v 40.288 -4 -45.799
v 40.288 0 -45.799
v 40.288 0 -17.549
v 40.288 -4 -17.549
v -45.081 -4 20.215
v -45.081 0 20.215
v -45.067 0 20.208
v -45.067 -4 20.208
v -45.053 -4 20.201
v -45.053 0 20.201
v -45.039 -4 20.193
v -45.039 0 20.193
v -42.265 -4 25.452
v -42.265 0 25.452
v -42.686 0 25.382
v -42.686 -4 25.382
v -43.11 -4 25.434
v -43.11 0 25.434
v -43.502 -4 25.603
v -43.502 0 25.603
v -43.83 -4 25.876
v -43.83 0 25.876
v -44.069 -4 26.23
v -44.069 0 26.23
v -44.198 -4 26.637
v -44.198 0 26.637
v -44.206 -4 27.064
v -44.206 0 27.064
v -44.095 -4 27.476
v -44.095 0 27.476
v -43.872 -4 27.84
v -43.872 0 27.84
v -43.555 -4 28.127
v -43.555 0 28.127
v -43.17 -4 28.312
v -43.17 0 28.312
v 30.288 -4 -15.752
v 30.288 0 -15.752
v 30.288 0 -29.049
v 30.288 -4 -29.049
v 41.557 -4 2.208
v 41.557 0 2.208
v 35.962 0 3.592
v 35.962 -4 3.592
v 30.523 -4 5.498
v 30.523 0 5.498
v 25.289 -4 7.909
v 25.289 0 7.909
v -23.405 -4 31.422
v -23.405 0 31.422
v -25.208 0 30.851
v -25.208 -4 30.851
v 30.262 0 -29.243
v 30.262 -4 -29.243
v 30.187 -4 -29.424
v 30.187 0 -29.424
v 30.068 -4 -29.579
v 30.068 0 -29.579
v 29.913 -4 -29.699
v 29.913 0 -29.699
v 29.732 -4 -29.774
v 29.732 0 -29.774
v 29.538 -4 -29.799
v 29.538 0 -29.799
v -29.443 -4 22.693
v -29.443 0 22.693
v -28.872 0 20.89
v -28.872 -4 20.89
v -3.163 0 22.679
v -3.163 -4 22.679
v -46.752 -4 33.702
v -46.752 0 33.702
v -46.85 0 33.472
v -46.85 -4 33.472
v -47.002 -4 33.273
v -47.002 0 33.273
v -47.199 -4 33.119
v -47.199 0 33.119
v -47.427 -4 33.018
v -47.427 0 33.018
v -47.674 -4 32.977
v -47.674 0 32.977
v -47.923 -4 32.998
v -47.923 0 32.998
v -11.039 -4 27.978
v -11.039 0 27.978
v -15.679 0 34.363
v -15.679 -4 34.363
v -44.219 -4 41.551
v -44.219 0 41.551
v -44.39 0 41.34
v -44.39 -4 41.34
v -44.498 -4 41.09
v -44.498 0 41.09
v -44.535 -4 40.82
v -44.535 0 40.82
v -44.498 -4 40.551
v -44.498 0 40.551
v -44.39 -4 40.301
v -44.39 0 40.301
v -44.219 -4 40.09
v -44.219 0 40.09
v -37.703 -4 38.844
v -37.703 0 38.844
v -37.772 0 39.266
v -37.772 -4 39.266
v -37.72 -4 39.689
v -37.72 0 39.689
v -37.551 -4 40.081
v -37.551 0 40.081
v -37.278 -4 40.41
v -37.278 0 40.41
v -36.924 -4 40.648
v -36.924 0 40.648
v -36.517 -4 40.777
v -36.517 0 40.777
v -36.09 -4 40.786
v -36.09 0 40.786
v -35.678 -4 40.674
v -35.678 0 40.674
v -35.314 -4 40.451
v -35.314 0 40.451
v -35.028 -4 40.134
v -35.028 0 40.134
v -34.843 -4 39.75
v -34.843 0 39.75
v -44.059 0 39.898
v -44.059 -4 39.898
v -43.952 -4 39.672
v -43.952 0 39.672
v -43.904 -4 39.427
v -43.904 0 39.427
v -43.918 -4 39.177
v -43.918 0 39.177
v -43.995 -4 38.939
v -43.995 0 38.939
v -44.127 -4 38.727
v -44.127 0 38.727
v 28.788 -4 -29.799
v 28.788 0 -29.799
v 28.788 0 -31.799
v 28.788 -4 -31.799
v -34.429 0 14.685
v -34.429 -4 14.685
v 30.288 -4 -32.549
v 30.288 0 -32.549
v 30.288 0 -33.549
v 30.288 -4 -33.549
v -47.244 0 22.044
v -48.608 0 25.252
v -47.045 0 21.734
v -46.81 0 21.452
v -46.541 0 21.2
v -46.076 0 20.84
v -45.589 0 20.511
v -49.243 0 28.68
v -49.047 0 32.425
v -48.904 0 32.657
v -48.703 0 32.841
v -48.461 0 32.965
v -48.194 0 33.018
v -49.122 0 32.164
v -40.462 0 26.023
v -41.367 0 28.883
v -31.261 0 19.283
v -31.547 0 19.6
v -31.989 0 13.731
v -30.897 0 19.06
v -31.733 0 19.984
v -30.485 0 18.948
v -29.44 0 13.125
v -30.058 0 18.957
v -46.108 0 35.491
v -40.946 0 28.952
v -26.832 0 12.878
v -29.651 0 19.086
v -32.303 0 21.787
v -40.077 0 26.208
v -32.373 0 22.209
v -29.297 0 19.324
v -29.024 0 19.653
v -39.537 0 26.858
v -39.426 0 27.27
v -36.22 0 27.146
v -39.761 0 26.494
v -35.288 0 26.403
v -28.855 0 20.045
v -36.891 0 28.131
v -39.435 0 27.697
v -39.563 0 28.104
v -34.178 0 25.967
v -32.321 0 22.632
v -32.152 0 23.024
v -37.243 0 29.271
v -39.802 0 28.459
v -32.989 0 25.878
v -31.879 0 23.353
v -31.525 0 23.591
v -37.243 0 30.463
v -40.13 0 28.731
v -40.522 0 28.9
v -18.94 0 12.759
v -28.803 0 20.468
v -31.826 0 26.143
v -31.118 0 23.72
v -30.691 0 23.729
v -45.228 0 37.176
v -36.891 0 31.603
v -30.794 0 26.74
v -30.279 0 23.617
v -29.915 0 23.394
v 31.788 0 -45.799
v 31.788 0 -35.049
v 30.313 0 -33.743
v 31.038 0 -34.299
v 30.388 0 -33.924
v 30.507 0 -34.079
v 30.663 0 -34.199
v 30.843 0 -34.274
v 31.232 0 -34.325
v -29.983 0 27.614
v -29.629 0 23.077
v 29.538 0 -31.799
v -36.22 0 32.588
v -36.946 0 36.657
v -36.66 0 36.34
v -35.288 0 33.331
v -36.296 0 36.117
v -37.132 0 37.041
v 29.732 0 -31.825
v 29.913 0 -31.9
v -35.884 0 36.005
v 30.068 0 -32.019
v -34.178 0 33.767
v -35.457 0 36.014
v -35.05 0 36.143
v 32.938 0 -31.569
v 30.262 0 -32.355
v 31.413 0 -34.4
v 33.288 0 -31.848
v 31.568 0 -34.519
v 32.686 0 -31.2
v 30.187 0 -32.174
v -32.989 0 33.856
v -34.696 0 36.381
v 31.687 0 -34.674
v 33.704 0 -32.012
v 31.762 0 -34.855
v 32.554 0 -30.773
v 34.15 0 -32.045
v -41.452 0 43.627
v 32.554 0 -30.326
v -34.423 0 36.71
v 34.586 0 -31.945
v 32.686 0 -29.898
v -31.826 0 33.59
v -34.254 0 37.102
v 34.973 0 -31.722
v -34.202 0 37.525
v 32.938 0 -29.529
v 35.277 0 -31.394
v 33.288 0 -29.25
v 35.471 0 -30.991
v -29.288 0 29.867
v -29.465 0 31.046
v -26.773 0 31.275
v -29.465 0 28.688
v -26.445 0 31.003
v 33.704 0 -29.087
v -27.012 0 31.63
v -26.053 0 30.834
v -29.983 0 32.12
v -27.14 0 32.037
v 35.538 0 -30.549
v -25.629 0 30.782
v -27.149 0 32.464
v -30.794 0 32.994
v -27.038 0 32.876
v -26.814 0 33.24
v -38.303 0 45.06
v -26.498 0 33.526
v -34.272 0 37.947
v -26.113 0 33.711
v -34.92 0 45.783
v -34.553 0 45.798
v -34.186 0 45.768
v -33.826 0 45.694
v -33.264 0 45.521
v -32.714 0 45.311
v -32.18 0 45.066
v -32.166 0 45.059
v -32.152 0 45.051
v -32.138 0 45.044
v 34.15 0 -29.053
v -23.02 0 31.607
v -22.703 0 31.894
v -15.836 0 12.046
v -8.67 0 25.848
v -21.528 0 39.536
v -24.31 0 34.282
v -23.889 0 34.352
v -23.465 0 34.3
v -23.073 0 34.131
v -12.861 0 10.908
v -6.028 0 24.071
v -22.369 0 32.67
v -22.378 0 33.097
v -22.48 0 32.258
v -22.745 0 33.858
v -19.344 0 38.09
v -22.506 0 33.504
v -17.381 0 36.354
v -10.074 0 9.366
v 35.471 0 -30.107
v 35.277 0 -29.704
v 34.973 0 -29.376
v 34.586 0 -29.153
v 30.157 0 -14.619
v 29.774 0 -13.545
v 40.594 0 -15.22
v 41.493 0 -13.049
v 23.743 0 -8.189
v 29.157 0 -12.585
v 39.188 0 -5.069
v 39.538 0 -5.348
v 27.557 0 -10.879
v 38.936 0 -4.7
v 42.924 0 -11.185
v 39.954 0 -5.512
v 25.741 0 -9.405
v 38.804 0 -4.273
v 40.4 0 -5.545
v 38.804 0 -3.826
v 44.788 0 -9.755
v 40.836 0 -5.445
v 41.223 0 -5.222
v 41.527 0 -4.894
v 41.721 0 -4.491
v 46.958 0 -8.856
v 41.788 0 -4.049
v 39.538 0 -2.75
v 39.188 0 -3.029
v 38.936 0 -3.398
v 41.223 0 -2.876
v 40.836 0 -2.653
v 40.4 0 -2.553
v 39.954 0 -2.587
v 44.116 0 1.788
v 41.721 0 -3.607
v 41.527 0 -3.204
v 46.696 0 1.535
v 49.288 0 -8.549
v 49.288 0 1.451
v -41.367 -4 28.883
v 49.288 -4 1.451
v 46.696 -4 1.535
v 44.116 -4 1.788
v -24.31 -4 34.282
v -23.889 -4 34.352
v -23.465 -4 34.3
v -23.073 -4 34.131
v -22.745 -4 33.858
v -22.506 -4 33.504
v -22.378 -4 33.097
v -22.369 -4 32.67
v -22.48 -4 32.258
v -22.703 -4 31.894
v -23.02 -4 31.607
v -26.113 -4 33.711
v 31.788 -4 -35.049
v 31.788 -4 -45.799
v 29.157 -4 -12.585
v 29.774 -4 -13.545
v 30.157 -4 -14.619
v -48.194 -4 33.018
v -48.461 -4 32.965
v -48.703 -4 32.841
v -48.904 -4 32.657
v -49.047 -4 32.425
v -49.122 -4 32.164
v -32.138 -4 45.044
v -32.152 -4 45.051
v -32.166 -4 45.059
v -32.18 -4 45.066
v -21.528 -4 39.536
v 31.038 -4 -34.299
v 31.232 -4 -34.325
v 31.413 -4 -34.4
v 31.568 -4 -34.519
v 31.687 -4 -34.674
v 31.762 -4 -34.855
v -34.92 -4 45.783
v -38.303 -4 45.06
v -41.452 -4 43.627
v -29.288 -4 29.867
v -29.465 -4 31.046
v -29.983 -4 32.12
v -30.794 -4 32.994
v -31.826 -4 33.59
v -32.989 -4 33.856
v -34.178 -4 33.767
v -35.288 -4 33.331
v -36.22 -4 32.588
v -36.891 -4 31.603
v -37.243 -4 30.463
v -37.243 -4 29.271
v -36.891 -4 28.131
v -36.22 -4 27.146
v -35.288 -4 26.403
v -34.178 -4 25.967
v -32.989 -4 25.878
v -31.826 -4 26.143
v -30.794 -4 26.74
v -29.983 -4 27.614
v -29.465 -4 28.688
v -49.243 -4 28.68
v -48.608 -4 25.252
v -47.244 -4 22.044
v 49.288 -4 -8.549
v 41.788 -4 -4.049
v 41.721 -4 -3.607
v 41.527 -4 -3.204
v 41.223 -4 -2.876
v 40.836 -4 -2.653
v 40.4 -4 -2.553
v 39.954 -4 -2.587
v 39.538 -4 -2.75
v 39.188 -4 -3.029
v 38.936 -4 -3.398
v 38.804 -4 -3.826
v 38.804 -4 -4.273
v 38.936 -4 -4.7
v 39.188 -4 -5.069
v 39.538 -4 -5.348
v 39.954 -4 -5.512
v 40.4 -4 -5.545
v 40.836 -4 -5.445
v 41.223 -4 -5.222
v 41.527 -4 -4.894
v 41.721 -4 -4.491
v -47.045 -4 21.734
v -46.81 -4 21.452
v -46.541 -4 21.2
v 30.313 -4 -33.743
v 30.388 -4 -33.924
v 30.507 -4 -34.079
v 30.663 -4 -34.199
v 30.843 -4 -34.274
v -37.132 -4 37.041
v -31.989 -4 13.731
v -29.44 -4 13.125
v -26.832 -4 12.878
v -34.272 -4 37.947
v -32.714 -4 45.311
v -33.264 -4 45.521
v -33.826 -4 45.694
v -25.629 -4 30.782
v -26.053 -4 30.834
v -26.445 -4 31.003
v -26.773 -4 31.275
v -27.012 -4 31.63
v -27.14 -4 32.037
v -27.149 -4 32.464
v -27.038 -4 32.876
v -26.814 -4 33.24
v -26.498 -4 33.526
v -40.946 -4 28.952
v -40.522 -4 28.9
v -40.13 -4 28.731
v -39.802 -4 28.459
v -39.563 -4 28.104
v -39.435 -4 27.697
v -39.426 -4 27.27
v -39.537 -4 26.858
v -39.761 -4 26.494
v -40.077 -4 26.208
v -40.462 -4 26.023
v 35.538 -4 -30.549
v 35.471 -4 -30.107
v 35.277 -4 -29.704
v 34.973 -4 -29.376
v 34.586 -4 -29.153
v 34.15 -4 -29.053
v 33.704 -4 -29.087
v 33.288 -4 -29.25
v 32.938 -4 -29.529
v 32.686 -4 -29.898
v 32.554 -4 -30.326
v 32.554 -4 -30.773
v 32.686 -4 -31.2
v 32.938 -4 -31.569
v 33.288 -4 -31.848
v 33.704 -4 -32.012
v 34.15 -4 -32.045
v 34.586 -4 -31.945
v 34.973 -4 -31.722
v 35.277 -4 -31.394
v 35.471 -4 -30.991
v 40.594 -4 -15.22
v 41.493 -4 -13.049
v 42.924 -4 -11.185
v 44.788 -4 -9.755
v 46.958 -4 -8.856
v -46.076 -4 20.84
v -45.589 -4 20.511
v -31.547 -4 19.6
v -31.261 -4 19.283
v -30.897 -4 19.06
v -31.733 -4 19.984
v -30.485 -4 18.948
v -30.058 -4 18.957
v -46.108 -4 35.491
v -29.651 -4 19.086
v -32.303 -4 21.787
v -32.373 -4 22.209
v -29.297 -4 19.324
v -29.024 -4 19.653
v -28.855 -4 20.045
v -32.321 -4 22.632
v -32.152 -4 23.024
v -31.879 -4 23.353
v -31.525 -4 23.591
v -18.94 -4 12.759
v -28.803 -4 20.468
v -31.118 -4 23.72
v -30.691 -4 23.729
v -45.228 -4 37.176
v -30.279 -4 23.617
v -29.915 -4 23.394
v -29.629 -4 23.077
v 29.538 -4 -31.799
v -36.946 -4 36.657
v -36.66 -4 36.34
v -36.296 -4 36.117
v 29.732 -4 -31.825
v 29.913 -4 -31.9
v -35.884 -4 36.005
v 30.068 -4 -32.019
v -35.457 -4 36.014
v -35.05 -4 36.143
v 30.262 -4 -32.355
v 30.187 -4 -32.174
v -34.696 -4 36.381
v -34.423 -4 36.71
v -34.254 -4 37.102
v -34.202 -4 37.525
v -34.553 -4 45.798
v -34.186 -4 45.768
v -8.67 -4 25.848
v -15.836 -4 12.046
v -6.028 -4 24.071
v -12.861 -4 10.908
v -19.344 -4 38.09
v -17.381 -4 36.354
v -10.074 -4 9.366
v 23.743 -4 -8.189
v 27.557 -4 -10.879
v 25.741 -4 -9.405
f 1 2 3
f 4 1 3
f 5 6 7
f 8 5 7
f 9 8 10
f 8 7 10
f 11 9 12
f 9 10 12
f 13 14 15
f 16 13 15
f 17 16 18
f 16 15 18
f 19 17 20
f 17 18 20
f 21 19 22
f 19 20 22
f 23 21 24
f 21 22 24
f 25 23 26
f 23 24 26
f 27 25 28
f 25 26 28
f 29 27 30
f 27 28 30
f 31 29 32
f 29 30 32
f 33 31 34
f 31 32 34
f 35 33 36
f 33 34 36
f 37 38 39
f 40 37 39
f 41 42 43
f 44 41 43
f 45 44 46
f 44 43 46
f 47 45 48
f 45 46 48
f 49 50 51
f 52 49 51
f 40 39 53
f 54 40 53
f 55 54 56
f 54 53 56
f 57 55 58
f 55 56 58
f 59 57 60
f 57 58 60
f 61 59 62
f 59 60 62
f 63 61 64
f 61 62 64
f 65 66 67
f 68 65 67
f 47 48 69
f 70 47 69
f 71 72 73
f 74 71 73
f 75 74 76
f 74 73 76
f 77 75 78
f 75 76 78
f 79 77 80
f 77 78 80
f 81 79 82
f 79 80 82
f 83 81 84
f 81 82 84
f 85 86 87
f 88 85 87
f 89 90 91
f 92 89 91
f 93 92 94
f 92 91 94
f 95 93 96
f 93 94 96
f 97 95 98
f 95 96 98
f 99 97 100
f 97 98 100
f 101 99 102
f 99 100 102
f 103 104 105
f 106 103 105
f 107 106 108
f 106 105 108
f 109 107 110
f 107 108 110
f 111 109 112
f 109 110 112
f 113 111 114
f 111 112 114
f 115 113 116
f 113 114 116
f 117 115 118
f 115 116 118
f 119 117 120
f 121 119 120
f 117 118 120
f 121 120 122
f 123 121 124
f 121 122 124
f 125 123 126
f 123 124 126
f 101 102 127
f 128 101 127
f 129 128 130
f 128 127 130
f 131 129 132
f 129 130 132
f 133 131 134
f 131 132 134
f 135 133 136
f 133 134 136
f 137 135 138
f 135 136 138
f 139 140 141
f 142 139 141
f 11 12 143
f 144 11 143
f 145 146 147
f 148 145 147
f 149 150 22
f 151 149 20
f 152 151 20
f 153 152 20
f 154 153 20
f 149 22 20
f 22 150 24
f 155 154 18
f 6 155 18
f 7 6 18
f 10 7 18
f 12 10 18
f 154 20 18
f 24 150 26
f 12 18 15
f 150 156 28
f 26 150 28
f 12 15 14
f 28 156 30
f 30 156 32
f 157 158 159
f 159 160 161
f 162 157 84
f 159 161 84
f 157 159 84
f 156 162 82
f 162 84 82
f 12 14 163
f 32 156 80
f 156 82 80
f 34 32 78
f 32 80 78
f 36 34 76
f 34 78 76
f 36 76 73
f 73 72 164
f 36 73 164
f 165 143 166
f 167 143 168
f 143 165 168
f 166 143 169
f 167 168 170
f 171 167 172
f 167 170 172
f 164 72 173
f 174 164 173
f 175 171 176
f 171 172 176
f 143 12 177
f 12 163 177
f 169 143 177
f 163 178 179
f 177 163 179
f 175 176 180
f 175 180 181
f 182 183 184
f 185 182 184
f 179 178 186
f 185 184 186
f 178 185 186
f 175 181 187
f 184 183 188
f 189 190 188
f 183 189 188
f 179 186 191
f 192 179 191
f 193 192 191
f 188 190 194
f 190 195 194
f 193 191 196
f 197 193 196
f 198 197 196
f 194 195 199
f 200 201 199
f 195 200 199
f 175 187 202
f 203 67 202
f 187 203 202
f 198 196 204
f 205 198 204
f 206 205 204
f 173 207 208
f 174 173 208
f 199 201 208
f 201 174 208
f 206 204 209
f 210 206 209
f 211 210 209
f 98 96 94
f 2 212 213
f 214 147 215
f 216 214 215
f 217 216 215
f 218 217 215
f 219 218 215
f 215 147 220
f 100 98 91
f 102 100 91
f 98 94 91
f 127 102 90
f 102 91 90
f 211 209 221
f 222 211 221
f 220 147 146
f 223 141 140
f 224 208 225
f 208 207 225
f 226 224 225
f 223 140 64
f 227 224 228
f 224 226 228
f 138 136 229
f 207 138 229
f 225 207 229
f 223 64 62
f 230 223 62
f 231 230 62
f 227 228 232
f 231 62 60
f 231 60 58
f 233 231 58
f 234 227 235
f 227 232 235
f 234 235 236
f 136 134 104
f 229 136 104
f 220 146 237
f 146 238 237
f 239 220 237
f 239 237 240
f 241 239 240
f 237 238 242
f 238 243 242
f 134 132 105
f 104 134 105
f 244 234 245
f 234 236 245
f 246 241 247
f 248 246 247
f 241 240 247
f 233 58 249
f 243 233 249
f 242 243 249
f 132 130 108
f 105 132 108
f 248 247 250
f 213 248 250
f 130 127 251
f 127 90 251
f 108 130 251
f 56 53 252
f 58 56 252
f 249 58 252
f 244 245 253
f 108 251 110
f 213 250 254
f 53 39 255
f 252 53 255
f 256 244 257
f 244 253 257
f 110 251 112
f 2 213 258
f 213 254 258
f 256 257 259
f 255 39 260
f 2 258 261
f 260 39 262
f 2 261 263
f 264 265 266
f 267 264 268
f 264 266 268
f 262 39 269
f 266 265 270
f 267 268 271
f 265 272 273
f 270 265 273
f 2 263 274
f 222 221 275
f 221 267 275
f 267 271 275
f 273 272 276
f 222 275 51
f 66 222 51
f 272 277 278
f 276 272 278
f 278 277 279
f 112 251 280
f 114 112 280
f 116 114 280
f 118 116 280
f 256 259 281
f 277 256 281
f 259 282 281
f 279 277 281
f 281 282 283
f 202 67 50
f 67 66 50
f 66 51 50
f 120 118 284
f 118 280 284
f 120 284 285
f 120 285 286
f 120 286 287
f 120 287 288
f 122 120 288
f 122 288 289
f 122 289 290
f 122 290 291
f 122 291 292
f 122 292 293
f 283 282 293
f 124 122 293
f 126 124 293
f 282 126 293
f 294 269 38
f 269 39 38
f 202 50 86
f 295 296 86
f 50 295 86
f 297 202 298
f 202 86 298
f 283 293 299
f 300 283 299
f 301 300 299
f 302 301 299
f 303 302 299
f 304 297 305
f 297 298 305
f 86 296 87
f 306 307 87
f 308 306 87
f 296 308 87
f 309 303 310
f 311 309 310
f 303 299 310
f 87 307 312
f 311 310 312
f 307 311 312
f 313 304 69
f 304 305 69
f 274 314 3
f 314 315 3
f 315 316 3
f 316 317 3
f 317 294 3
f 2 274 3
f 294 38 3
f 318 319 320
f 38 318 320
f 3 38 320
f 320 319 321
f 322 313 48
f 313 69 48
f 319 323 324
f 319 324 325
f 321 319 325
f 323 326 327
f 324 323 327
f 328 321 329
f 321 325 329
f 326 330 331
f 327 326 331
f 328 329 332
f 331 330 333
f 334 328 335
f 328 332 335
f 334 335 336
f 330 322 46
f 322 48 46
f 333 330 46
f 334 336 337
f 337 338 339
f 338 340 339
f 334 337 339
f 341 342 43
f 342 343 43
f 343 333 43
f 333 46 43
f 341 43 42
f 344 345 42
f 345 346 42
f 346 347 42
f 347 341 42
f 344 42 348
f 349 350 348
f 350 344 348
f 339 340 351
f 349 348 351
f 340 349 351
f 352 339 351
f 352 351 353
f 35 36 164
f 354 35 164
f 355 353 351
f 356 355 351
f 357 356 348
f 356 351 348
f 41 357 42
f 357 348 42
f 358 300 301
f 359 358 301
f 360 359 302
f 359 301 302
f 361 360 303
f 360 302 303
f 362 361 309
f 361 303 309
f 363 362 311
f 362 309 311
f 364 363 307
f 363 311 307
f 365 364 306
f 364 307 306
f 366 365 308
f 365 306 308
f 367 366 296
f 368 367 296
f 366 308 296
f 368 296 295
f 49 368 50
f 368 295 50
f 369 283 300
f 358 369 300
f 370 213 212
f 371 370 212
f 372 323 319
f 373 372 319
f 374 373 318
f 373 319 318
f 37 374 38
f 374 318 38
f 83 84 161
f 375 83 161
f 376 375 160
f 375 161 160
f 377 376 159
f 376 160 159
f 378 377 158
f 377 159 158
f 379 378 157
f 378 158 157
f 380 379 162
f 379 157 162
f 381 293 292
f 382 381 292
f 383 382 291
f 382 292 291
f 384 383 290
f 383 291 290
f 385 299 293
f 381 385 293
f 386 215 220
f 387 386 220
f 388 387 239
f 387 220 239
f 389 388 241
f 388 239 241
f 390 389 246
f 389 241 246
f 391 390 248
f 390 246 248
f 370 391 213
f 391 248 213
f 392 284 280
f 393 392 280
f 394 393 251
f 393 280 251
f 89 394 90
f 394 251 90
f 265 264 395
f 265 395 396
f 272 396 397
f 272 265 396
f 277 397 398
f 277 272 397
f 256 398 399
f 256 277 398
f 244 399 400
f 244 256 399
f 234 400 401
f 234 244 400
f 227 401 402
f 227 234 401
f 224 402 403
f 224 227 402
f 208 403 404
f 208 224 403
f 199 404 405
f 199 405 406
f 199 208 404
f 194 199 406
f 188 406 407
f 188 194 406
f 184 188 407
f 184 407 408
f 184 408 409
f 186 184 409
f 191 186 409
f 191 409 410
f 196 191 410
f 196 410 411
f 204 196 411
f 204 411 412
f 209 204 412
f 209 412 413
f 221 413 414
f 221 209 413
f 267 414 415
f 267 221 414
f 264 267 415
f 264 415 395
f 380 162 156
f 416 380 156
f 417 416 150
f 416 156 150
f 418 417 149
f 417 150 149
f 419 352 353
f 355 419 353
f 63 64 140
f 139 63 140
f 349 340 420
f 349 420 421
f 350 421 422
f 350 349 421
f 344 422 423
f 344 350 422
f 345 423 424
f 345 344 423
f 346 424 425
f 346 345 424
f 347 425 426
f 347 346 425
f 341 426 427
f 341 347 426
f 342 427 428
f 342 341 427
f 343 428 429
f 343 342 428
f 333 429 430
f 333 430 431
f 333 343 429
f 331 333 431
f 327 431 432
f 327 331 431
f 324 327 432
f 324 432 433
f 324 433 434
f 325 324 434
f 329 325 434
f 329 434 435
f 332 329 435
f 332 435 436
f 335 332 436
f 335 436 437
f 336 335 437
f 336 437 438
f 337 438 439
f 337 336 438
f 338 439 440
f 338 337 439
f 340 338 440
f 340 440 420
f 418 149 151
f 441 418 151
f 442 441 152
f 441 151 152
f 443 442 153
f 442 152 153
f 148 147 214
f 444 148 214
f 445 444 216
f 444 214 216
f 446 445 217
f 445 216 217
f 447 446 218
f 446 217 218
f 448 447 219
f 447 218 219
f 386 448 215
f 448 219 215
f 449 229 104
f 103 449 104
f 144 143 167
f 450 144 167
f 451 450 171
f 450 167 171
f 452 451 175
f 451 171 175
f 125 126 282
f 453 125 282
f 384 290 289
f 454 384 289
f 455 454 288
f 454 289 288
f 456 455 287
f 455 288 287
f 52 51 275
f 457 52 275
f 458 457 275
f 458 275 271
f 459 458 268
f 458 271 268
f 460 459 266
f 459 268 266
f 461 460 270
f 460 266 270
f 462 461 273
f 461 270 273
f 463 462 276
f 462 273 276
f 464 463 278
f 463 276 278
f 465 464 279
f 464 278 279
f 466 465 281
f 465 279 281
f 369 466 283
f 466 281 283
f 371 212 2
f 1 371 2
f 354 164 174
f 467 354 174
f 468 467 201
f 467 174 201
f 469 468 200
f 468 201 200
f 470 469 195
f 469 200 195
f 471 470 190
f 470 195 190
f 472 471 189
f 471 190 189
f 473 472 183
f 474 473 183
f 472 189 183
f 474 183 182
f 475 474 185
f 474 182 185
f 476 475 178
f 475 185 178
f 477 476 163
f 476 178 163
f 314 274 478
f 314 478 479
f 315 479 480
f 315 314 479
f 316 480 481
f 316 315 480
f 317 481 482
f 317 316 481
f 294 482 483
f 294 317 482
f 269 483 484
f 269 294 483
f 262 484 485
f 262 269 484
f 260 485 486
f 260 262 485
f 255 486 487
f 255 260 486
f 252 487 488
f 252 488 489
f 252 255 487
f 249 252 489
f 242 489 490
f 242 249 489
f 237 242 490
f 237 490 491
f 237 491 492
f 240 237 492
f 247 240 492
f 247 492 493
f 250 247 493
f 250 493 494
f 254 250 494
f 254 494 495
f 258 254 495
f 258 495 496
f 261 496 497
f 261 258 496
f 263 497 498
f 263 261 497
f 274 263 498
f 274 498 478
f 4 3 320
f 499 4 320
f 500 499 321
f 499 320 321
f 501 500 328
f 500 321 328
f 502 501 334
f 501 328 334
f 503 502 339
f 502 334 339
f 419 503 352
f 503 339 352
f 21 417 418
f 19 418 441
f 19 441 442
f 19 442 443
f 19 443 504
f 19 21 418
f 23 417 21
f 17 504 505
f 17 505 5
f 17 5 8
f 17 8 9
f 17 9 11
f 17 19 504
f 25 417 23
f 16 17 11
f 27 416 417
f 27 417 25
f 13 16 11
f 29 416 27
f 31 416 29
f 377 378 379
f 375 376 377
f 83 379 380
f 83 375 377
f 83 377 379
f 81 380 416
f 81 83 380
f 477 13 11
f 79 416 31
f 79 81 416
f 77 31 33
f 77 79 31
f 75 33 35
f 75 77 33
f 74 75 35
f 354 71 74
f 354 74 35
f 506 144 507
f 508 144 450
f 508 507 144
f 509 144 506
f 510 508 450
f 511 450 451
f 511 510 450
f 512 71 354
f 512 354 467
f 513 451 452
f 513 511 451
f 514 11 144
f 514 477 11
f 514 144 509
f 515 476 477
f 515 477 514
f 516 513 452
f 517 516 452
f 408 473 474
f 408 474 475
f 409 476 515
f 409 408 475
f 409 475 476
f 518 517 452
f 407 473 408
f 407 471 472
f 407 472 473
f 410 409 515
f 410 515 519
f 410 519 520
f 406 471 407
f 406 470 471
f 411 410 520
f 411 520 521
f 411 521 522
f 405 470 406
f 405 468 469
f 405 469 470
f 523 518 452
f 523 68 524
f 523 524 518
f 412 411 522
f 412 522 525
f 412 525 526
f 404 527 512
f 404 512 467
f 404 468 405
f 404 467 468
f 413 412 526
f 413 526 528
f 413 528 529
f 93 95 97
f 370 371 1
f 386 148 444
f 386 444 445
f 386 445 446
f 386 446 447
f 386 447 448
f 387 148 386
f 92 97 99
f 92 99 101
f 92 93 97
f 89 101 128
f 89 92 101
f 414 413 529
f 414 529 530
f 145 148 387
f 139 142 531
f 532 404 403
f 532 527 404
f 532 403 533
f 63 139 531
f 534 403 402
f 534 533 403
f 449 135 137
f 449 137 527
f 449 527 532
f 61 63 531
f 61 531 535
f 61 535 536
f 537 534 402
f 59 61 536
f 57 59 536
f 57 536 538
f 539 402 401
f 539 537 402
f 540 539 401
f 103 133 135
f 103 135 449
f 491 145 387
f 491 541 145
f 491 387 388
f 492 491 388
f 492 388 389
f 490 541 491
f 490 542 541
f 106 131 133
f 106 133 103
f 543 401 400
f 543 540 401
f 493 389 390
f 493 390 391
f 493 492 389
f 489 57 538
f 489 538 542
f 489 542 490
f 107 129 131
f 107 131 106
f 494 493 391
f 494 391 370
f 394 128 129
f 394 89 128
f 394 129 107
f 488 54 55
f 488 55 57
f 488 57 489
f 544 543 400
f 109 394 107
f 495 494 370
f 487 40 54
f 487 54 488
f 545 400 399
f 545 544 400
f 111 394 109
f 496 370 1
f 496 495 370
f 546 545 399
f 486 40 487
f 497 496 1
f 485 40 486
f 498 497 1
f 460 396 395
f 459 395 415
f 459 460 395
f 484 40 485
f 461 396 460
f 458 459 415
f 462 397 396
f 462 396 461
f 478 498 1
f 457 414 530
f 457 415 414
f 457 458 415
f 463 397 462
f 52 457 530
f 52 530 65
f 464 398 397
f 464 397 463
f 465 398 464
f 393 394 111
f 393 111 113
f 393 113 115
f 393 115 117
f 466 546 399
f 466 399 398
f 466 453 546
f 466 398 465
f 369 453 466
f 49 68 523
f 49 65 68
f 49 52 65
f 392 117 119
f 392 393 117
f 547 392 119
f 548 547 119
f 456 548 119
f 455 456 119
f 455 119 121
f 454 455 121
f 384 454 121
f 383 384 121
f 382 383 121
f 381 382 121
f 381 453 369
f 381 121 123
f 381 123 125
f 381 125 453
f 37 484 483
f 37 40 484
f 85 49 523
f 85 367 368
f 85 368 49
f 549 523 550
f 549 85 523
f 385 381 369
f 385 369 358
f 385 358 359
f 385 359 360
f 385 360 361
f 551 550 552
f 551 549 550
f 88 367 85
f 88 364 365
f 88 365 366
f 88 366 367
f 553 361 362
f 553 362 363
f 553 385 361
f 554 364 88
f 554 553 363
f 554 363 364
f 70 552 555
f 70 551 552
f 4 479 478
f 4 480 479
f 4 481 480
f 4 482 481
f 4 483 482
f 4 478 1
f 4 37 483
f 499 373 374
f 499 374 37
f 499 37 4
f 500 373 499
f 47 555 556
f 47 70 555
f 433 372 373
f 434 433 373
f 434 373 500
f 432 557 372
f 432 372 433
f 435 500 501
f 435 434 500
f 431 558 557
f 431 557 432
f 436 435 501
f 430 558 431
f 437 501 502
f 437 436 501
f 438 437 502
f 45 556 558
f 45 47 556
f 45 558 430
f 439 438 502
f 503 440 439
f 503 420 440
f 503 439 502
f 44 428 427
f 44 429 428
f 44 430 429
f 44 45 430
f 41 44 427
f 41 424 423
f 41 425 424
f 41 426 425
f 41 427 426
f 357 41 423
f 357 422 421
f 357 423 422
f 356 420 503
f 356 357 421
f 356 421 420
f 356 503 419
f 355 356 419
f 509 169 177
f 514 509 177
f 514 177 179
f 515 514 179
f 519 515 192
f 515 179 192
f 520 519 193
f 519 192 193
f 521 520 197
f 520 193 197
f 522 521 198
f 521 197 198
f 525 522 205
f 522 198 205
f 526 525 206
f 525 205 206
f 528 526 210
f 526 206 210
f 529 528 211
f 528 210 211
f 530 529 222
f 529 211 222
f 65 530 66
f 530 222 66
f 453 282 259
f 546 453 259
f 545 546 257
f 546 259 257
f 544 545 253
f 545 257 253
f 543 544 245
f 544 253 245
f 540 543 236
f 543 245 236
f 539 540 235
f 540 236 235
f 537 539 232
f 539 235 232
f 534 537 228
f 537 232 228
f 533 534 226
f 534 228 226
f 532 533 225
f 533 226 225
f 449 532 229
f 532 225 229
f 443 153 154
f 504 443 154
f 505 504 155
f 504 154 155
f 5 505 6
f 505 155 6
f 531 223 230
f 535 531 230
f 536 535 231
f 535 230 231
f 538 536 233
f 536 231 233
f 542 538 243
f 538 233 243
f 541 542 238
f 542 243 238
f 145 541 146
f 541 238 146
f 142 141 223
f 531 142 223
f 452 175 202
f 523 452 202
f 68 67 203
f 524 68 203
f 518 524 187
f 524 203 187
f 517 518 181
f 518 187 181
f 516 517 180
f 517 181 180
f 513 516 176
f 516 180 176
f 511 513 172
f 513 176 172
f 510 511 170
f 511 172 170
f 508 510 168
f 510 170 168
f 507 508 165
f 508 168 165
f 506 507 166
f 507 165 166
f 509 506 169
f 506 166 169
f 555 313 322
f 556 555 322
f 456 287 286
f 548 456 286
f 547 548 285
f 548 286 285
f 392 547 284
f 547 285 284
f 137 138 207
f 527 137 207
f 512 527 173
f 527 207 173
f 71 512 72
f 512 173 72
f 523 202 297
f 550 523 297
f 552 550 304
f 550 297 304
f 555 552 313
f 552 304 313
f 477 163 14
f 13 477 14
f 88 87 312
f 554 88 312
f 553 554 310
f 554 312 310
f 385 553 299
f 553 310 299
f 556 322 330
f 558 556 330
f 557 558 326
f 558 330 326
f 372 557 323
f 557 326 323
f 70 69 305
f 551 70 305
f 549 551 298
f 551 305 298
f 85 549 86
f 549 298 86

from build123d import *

# Parameters (mm, degrees)
F0_R     = 1.5
F0_R_2   = 4
F1_DEPTH = 4


# Not quite as in the source:
# - ends of sketch curves that miss each other by under 0.0002 mm in the source are joined


with BuildPart() as f1:
    # F0 (on Front) → F1 (new body)
    with BuildSketch(Plane.XZ):
        with BuildLine():
            ThreePointArc((-46.7520374748, 33.7019691352), (-47.1985525616, 33.1188473182), (-47.9229891353, 32.9980233677))
            ThreePointArc((-47.9229891353, 32.9980233677), (-48.7034151976, 32.8409436846), (-49.1218329373, 32.1636949909))
            ThreePointArc((-49.1218329373, 32.1636949909), (-49.0191167234, 26.9485703376), (-47.2444231086, 22.0436199391))
            ThreePointArc((-47.2444231086, 22.0436199391), (-46.9316892388, 21.5893722277), (-46.5410881725, 21.2000467918))
            ThreePointArc((-46.5410881725, 21.2000467918), (-45.835088561, 20.6717193883), (-45.0805279455, 20.2154261011))
            ThreePointArc((-45.0805279455, 20.2154261011), (-45.0596673609, 20.2042820611), (-45.0387197194, 20.1933025406))
            Line((-45.0387197194, 20.1933025406), (-34.428702, 14.685356))
            ThreePointArc((-34.428702, 14.685356), (-30.7249663127, 13.3838083991), (-26.831855016, 12.8784683528))
            Line((-26.831855016, 12.8784683528), (-18.940113, 12.75863))
            ThreePointArc((-18.940113, 12.75863), (-14.3281771728, 11.5292251091), (-10.0737090286, 9.3656889559))
            Line((-10.0737090286, 9.3656889559), (23.742856, -8.189399))
            ThreePointArc((23.742856, -8.189399), (26.6741197813, -10.1115239367), (29.157366832, -12.5854591375))
            ThreePointArc((29.157366832, -12.5854591375), (29.9965212655, -14.0706922033), (30.287531, -15.751588))
            Line((30.287531, -15.751588), (30.287531, -29.049112))
            ThreePointArc((30.287531, -29.049112), (30.0678610859, -29.5794420859), (29.537531, -29.799112))
            Line((29.537531, -29.799112), (28.787531, -29.799112))
            Line((28.787531, -29.799112), (28.787531, -31.799112))
            Line((28.787531, -31.799112), (29.537531, -31.799112))
            ThreePointArc((29.537531, -31.799112), (30.0678610859, -32.0187819141), (30.287531, -32.549112))
            Line((30.287531, -32.549112), (30.287531, -33.549112))
            ThreePointArc((30.287531, -33.549112), (30.5072009141, -34.0794420859), (31.037531, -34.299112))
            ThreePointArc((31.037531, -34.299112), (31.5678610859, -34.5187819141), (31.787531, -35.049112))
            Line((31.787531, -35.049112), (31.787531, -45.799112))
            Line((31.787531, -45.799112), (40.287531, -45.799112))
            Line((40.287531, -45.799112), (40.287531, -17.549112))
            ThreePointArc((40.287531, -17.549112), (42.9235699693, -11.1851509693), (49.287531, -8.549112))
            Line((49.287531, -8.549112), (49.287531, 1.450888))
            ThreePointArc((49.287531, 1.450888), (45.4037577728, 1.6406387059), (41.5569790733, 2.2080833707))
            ThreePointArc((41.5569790733, 2.2080833707), (33.2204107171, 4.4808989987), (25.2886487268, 7.9089034738))
            Line((25.2886487268, 7.9089034738), (-3.162569, 22.678696))
            ThreePointArc((-3.162569, 22.678696), (-7.380174163, 24.9132414841), (-11.0394989374, 27.9776710605))
            Line((-11.0394989374, 27.9776710605), (-15.678673, 34.362967))
            ThreePointArc((-15.678673, 34.362967), (-18.332187349, 37.2561568684), (-21.5279068846, 39.5363022038))
            Line((-21.5279068846, 39.5363022038), (-32.137926, 45.044248))
            ThreePointArc((-32.137926, 45.044248), (-32.1589591581, 45.0550621571), (-32.1800770412, 45.0657099174))
            ThreePointArc((-32.1800770412, 45.0657099174), (-32.9874548739, 45.4202604433), (-33.8258020362, 45.693644867))
            ThreePointArc((-33.8258020362, 45.693644867), (-34.3689763365, 45.7890671015), (-34.9204399653, 45.7834476614))
            ThreePointArc((-34.9204399653, 45.7834476614), (-39.9164421929, 44.4291859973), (-44.218633855, 41.550781845))
            ThreePointArc((-44.218633855, 41.550781845), (-44.5354399962, 40.8204576148), (-44.2185063254, 40.090188652))
            ThreePointArc((-44.2185063254, 40.090188652), (-43.903802542, 39.4265860913), (-44.1273026907, 38.7269757472))
            ThreePointArc((-44.1273026907, 38.7269757472), (-45.6966868361, 36.3487212178), (-46.7520374748, 33.7019691352))
        make_face()
        with Locations((34.037531, -30.549112)):
            Circle(F0_R, mode=Mode.SUBTRACT)
        with Locations((40.287531, -4.049112)):
            Circle(F0_R, mode=Mode.SUBTRACT)
        with BuildLine():
            Line((-29.443172, 22.692668), (-28.872421, 20.889608))
            ThreePointArc((-28.872421, 20.889608), (-29.8498040801, 19.0068647531), (-31.7325472924, 19.984248224))
            Line((-31.7325472924, 19.984248224), (-32.303298, 21.787307))
            ThreePointArc((-32.303298, 21.787307), (-31.3259155182, 23.6700510575), (-29.443172, 22.692668))
        make_face(mode=Mode.SUBTRACT)
        with BuildLine():
            Line((-40.461853, 26.022633), (-42.264913, 25.451882))
            ThreePointArc((-42.264913, 25.451882), (-44.1476570575, 26.4292644818), (-43.1702740637, 28.3120082014))
            Line((-43.1702740637, 28.3120082014), (-41.367214, 28.882759))
            ThreePointArc((-41.367214, 28.882759), (-39.4844709425, 27.9053765182), (-40.461853, 26.022633))
        make_face(mode=Mode.SUBTRACT)
        with Locations((-33.28753, 29.866991)):
            Circle(F0_R_2, mode=Mode.SUBTRACT)
        with BuildLine():
            Line((-26.113207, 33.711349), (-24.310148, 34.2821))
            ThreePointArc((-24.310148, 34.2821), (-22.4274039425, 33.3047175182), (-23.4047869363, 31.4219737986))
            Line((-23.4047869363, 31.4219737986), (-25.207847, 30.851223))
            ThreePointArc((-25.207847, 30.851223), (-27.0905902014, 31.8286059363), (-26.113207, 33.711349))
        make_face(mode=Mode.SUBTRACT)
        with BuildLine():
            Line((-37.131889, 37.041314), (-37.70264, 38.844374))
            ThreePointArc((-37.70264, 38.844374), (-36.7252563743, 40.727117103), (-34.8425130864, 39.7497349727))
            Line((-34.8425130864, 39.7497349727), (-34.271762, 37.946675))
            ThreePointArc((-34.271762, 37.946675), (-35.2491456257, 36.063930897), (-37.131889, 37.041314))
        make_face(mode=Mode.SUBTRACT)
    extrude(amount=F1_DEPTH)


solid = f1.part
